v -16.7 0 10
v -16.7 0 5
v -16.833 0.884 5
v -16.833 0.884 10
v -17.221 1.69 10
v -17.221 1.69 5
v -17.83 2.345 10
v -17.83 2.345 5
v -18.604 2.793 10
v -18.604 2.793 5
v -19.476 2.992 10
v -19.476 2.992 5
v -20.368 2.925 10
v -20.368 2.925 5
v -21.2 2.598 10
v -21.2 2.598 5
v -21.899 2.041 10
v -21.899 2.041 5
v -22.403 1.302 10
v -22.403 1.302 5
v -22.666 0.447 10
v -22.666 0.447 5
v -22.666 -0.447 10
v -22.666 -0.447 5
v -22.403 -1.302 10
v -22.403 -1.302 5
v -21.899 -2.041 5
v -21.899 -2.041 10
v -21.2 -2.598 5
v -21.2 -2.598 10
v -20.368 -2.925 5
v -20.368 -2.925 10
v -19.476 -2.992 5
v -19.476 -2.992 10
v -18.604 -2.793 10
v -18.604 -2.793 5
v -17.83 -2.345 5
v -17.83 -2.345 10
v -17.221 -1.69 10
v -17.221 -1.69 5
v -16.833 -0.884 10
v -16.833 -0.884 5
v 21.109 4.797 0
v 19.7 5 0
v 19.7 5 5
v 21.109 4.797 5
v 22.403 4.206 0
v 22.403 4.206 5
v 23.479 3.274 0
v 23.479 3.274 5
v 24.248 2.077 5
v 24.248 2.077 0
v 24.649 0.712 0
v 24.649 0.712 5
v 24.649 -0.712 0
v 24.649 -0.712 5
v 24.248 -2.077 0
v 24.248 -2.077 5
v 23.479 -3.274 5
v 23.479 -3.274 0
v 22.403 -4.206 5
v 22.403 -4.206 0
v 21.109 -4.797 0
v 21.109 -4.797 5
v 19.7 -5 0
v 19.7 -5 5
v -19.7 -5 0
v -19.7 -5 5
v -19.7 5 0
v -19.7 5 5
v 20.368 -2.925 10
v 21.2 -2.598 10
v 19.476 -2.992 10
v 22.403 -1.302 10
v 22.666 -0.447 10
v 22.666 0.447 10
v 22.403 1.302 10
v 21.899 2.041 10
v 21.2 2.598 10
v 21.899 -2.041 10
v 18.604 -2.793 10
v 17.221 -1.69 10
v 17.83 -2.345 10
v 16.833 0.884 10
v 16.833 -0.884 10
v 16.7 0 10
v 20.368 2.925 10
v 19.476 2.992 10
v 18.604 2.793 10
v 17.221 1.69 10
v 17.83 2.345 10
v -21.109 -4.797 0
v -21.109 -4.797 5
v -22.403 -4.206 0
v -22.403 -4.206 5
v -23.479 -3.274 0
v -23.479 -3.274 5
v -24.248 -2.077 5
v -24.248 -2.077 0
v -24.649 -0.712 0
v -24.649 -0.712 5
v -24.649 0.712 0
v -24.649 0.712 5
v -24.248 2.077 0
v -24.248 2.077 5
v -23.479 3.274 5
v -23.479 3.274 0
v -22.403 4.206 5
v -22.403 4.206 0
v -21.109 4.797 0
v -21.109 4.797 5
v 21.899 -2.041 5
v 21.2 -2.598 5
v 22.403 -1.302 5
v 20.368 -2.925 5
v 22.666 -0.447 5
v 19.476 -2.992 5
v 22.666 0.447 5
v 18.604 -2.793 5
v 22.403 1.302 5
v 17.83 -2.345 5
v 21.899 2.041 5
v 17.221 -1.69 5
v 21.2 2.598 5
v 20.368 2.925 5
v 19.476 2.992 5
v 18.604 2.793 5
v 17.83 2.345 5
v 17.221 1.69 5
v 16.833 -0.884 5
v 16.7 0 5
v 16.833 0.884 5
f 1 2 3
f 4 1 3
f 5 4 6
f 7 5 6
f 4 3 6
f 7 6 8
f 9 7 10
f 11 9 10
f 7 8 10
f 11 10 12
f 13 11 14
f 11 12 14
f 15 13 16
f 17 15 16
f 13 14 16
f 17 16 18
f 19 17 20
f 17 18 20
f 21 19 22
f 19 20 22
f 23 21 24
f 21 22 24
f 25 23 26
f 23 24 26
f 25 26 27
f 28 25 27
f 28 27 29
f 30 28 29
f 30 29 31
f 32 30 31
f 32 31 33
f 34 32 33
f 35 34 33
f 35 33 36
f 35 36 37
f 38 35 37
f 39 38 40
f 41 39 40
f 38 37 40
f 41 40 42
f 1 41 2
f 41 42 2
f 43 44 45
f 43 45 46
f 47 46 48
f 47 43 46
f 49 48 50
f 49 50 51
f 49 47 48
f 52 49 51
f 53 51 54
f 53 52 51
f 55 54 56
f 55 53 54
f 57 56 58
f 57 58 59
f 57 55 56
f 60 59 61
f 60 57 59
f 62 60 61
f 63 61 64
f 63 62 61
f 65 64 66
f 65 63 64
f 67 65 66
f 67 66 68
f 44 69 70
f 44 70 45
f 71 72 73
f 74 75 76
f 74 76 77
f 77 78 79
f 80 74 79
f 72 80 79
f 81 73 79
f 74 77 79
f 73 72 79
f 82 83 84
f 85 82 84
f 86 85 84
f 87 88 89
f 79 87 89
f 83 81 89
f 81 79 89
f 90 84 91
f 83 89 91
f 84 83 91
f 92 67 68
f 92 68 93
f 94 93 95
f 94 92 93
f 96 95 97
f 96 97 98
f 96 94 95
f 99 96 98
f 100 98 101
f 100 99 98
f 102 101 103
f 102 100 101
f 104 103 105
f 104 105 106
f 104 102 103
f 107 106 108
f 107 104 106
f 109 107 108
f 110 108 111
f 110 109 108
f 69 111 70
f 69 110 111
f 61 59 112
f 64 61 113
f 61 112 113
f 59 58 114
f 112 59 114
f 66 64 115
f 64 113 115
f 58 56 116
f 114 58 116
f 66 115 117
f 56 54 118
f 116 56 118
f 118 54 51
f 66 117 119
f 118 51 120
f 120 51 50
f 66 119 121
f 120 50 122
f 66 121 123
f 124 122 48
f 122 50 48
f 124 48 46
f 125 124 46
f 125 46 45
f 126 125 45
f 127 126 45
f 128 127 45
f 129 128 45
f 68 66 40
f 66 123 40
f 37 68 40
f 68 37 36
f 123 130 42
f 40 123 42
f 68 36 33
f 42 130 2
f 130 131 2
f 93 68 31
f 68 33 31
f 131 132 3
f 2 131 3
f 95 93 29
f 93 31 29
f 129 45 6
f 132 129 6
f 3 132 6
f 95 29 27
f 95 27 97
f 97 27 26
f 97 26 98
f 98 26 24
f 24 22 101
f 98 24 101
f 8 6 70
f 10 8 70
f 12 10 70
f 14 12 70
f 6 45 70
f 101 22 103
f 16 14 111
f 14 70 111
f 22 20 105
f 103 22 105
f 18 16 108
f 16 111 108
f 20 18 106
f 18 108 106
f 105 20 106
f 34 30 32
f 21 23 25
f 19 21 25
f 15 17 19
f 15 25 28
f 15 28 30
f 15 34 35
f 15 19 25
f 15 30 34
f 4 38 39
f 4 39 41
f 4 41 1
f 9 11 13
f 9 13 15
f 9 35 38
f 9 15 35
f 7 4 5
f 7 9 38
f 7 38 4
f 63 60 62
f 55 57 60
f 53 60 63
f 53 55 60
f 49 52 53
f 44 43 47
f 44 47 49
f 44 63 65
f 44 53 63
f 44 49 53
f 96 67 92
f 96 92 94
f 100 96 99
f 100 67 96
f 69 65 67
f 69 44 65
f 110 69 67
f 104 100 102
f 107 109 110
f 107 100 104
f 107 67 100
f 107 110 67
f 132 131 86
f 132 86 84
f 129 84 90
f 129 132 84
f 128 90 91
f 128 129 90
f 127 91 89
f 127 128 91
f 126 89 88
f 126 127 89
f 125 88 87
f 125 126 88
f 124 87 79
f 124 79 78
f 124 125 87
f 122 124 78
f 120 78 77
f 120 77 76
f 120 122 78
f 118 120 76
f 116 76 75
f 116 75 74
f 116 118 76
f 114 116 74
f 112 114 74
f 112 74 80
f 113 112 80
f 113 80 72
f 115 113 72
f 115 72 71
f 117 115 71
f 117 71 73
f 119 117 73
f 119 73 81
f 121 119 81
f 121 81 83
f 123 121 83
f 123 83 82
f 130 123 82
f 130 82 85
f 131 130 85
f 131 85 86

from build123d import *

# Parameters (mm, degrees)
SKETCH1_R           = 3
BOSS_EXTRUDE1_DEPTH = 5
SKETCH2_R           = 3
BOSS_EXTRUDE2_DEPTH = 5
SKETCH3_R           = 3
BOSS_EXTRUDE3_DEPTH = 10


with BuildPart() as part:
    # Sketch1 → Boss-Extrude1 (new body)
    with BuildSketch(Plane.XY):
        with BuildLine():
            Line((19.7, -5), (-19.7, -5))
            ThreePointArc((-19.7, -5), (-24.7, 0), (-19.7, 5))
            Line((-19.7, 5), (19.7, 5))
            ThreePointArc((19.7, 5), (24.7, 0), (19.7, -5))
        make_face()
        with Locations((19.7, 0)):
            Circle(SKETCH1_R, mode=Mode.SUBTRACT)
    extrude(amount=BOSS_EXTRUDE1_DEPTH)

    # Sketch2 → Boss-Extrude2 (add)
    with BuildSketch(Plane.XY.offset(5)):
        with Locations((-19.7, 0)):
            Circle(SKETCH2_R)
    extrude(amount=BOSS_EXTRUDE2_DEPTH)

    # Sketch3 → Boss-Extrude3 (add)
    with BuildSketch(Plane(origin=(0, 0, 0), x_dir=(-1, 0, 0), z_dir=(0, 0, -1))):
        with Locations((-19.7, 0)):
            Circle(SKETCH3_R)
    extrude(amount=-BOSS_EXTRUDE3_DEPTH)


solid = part.part
